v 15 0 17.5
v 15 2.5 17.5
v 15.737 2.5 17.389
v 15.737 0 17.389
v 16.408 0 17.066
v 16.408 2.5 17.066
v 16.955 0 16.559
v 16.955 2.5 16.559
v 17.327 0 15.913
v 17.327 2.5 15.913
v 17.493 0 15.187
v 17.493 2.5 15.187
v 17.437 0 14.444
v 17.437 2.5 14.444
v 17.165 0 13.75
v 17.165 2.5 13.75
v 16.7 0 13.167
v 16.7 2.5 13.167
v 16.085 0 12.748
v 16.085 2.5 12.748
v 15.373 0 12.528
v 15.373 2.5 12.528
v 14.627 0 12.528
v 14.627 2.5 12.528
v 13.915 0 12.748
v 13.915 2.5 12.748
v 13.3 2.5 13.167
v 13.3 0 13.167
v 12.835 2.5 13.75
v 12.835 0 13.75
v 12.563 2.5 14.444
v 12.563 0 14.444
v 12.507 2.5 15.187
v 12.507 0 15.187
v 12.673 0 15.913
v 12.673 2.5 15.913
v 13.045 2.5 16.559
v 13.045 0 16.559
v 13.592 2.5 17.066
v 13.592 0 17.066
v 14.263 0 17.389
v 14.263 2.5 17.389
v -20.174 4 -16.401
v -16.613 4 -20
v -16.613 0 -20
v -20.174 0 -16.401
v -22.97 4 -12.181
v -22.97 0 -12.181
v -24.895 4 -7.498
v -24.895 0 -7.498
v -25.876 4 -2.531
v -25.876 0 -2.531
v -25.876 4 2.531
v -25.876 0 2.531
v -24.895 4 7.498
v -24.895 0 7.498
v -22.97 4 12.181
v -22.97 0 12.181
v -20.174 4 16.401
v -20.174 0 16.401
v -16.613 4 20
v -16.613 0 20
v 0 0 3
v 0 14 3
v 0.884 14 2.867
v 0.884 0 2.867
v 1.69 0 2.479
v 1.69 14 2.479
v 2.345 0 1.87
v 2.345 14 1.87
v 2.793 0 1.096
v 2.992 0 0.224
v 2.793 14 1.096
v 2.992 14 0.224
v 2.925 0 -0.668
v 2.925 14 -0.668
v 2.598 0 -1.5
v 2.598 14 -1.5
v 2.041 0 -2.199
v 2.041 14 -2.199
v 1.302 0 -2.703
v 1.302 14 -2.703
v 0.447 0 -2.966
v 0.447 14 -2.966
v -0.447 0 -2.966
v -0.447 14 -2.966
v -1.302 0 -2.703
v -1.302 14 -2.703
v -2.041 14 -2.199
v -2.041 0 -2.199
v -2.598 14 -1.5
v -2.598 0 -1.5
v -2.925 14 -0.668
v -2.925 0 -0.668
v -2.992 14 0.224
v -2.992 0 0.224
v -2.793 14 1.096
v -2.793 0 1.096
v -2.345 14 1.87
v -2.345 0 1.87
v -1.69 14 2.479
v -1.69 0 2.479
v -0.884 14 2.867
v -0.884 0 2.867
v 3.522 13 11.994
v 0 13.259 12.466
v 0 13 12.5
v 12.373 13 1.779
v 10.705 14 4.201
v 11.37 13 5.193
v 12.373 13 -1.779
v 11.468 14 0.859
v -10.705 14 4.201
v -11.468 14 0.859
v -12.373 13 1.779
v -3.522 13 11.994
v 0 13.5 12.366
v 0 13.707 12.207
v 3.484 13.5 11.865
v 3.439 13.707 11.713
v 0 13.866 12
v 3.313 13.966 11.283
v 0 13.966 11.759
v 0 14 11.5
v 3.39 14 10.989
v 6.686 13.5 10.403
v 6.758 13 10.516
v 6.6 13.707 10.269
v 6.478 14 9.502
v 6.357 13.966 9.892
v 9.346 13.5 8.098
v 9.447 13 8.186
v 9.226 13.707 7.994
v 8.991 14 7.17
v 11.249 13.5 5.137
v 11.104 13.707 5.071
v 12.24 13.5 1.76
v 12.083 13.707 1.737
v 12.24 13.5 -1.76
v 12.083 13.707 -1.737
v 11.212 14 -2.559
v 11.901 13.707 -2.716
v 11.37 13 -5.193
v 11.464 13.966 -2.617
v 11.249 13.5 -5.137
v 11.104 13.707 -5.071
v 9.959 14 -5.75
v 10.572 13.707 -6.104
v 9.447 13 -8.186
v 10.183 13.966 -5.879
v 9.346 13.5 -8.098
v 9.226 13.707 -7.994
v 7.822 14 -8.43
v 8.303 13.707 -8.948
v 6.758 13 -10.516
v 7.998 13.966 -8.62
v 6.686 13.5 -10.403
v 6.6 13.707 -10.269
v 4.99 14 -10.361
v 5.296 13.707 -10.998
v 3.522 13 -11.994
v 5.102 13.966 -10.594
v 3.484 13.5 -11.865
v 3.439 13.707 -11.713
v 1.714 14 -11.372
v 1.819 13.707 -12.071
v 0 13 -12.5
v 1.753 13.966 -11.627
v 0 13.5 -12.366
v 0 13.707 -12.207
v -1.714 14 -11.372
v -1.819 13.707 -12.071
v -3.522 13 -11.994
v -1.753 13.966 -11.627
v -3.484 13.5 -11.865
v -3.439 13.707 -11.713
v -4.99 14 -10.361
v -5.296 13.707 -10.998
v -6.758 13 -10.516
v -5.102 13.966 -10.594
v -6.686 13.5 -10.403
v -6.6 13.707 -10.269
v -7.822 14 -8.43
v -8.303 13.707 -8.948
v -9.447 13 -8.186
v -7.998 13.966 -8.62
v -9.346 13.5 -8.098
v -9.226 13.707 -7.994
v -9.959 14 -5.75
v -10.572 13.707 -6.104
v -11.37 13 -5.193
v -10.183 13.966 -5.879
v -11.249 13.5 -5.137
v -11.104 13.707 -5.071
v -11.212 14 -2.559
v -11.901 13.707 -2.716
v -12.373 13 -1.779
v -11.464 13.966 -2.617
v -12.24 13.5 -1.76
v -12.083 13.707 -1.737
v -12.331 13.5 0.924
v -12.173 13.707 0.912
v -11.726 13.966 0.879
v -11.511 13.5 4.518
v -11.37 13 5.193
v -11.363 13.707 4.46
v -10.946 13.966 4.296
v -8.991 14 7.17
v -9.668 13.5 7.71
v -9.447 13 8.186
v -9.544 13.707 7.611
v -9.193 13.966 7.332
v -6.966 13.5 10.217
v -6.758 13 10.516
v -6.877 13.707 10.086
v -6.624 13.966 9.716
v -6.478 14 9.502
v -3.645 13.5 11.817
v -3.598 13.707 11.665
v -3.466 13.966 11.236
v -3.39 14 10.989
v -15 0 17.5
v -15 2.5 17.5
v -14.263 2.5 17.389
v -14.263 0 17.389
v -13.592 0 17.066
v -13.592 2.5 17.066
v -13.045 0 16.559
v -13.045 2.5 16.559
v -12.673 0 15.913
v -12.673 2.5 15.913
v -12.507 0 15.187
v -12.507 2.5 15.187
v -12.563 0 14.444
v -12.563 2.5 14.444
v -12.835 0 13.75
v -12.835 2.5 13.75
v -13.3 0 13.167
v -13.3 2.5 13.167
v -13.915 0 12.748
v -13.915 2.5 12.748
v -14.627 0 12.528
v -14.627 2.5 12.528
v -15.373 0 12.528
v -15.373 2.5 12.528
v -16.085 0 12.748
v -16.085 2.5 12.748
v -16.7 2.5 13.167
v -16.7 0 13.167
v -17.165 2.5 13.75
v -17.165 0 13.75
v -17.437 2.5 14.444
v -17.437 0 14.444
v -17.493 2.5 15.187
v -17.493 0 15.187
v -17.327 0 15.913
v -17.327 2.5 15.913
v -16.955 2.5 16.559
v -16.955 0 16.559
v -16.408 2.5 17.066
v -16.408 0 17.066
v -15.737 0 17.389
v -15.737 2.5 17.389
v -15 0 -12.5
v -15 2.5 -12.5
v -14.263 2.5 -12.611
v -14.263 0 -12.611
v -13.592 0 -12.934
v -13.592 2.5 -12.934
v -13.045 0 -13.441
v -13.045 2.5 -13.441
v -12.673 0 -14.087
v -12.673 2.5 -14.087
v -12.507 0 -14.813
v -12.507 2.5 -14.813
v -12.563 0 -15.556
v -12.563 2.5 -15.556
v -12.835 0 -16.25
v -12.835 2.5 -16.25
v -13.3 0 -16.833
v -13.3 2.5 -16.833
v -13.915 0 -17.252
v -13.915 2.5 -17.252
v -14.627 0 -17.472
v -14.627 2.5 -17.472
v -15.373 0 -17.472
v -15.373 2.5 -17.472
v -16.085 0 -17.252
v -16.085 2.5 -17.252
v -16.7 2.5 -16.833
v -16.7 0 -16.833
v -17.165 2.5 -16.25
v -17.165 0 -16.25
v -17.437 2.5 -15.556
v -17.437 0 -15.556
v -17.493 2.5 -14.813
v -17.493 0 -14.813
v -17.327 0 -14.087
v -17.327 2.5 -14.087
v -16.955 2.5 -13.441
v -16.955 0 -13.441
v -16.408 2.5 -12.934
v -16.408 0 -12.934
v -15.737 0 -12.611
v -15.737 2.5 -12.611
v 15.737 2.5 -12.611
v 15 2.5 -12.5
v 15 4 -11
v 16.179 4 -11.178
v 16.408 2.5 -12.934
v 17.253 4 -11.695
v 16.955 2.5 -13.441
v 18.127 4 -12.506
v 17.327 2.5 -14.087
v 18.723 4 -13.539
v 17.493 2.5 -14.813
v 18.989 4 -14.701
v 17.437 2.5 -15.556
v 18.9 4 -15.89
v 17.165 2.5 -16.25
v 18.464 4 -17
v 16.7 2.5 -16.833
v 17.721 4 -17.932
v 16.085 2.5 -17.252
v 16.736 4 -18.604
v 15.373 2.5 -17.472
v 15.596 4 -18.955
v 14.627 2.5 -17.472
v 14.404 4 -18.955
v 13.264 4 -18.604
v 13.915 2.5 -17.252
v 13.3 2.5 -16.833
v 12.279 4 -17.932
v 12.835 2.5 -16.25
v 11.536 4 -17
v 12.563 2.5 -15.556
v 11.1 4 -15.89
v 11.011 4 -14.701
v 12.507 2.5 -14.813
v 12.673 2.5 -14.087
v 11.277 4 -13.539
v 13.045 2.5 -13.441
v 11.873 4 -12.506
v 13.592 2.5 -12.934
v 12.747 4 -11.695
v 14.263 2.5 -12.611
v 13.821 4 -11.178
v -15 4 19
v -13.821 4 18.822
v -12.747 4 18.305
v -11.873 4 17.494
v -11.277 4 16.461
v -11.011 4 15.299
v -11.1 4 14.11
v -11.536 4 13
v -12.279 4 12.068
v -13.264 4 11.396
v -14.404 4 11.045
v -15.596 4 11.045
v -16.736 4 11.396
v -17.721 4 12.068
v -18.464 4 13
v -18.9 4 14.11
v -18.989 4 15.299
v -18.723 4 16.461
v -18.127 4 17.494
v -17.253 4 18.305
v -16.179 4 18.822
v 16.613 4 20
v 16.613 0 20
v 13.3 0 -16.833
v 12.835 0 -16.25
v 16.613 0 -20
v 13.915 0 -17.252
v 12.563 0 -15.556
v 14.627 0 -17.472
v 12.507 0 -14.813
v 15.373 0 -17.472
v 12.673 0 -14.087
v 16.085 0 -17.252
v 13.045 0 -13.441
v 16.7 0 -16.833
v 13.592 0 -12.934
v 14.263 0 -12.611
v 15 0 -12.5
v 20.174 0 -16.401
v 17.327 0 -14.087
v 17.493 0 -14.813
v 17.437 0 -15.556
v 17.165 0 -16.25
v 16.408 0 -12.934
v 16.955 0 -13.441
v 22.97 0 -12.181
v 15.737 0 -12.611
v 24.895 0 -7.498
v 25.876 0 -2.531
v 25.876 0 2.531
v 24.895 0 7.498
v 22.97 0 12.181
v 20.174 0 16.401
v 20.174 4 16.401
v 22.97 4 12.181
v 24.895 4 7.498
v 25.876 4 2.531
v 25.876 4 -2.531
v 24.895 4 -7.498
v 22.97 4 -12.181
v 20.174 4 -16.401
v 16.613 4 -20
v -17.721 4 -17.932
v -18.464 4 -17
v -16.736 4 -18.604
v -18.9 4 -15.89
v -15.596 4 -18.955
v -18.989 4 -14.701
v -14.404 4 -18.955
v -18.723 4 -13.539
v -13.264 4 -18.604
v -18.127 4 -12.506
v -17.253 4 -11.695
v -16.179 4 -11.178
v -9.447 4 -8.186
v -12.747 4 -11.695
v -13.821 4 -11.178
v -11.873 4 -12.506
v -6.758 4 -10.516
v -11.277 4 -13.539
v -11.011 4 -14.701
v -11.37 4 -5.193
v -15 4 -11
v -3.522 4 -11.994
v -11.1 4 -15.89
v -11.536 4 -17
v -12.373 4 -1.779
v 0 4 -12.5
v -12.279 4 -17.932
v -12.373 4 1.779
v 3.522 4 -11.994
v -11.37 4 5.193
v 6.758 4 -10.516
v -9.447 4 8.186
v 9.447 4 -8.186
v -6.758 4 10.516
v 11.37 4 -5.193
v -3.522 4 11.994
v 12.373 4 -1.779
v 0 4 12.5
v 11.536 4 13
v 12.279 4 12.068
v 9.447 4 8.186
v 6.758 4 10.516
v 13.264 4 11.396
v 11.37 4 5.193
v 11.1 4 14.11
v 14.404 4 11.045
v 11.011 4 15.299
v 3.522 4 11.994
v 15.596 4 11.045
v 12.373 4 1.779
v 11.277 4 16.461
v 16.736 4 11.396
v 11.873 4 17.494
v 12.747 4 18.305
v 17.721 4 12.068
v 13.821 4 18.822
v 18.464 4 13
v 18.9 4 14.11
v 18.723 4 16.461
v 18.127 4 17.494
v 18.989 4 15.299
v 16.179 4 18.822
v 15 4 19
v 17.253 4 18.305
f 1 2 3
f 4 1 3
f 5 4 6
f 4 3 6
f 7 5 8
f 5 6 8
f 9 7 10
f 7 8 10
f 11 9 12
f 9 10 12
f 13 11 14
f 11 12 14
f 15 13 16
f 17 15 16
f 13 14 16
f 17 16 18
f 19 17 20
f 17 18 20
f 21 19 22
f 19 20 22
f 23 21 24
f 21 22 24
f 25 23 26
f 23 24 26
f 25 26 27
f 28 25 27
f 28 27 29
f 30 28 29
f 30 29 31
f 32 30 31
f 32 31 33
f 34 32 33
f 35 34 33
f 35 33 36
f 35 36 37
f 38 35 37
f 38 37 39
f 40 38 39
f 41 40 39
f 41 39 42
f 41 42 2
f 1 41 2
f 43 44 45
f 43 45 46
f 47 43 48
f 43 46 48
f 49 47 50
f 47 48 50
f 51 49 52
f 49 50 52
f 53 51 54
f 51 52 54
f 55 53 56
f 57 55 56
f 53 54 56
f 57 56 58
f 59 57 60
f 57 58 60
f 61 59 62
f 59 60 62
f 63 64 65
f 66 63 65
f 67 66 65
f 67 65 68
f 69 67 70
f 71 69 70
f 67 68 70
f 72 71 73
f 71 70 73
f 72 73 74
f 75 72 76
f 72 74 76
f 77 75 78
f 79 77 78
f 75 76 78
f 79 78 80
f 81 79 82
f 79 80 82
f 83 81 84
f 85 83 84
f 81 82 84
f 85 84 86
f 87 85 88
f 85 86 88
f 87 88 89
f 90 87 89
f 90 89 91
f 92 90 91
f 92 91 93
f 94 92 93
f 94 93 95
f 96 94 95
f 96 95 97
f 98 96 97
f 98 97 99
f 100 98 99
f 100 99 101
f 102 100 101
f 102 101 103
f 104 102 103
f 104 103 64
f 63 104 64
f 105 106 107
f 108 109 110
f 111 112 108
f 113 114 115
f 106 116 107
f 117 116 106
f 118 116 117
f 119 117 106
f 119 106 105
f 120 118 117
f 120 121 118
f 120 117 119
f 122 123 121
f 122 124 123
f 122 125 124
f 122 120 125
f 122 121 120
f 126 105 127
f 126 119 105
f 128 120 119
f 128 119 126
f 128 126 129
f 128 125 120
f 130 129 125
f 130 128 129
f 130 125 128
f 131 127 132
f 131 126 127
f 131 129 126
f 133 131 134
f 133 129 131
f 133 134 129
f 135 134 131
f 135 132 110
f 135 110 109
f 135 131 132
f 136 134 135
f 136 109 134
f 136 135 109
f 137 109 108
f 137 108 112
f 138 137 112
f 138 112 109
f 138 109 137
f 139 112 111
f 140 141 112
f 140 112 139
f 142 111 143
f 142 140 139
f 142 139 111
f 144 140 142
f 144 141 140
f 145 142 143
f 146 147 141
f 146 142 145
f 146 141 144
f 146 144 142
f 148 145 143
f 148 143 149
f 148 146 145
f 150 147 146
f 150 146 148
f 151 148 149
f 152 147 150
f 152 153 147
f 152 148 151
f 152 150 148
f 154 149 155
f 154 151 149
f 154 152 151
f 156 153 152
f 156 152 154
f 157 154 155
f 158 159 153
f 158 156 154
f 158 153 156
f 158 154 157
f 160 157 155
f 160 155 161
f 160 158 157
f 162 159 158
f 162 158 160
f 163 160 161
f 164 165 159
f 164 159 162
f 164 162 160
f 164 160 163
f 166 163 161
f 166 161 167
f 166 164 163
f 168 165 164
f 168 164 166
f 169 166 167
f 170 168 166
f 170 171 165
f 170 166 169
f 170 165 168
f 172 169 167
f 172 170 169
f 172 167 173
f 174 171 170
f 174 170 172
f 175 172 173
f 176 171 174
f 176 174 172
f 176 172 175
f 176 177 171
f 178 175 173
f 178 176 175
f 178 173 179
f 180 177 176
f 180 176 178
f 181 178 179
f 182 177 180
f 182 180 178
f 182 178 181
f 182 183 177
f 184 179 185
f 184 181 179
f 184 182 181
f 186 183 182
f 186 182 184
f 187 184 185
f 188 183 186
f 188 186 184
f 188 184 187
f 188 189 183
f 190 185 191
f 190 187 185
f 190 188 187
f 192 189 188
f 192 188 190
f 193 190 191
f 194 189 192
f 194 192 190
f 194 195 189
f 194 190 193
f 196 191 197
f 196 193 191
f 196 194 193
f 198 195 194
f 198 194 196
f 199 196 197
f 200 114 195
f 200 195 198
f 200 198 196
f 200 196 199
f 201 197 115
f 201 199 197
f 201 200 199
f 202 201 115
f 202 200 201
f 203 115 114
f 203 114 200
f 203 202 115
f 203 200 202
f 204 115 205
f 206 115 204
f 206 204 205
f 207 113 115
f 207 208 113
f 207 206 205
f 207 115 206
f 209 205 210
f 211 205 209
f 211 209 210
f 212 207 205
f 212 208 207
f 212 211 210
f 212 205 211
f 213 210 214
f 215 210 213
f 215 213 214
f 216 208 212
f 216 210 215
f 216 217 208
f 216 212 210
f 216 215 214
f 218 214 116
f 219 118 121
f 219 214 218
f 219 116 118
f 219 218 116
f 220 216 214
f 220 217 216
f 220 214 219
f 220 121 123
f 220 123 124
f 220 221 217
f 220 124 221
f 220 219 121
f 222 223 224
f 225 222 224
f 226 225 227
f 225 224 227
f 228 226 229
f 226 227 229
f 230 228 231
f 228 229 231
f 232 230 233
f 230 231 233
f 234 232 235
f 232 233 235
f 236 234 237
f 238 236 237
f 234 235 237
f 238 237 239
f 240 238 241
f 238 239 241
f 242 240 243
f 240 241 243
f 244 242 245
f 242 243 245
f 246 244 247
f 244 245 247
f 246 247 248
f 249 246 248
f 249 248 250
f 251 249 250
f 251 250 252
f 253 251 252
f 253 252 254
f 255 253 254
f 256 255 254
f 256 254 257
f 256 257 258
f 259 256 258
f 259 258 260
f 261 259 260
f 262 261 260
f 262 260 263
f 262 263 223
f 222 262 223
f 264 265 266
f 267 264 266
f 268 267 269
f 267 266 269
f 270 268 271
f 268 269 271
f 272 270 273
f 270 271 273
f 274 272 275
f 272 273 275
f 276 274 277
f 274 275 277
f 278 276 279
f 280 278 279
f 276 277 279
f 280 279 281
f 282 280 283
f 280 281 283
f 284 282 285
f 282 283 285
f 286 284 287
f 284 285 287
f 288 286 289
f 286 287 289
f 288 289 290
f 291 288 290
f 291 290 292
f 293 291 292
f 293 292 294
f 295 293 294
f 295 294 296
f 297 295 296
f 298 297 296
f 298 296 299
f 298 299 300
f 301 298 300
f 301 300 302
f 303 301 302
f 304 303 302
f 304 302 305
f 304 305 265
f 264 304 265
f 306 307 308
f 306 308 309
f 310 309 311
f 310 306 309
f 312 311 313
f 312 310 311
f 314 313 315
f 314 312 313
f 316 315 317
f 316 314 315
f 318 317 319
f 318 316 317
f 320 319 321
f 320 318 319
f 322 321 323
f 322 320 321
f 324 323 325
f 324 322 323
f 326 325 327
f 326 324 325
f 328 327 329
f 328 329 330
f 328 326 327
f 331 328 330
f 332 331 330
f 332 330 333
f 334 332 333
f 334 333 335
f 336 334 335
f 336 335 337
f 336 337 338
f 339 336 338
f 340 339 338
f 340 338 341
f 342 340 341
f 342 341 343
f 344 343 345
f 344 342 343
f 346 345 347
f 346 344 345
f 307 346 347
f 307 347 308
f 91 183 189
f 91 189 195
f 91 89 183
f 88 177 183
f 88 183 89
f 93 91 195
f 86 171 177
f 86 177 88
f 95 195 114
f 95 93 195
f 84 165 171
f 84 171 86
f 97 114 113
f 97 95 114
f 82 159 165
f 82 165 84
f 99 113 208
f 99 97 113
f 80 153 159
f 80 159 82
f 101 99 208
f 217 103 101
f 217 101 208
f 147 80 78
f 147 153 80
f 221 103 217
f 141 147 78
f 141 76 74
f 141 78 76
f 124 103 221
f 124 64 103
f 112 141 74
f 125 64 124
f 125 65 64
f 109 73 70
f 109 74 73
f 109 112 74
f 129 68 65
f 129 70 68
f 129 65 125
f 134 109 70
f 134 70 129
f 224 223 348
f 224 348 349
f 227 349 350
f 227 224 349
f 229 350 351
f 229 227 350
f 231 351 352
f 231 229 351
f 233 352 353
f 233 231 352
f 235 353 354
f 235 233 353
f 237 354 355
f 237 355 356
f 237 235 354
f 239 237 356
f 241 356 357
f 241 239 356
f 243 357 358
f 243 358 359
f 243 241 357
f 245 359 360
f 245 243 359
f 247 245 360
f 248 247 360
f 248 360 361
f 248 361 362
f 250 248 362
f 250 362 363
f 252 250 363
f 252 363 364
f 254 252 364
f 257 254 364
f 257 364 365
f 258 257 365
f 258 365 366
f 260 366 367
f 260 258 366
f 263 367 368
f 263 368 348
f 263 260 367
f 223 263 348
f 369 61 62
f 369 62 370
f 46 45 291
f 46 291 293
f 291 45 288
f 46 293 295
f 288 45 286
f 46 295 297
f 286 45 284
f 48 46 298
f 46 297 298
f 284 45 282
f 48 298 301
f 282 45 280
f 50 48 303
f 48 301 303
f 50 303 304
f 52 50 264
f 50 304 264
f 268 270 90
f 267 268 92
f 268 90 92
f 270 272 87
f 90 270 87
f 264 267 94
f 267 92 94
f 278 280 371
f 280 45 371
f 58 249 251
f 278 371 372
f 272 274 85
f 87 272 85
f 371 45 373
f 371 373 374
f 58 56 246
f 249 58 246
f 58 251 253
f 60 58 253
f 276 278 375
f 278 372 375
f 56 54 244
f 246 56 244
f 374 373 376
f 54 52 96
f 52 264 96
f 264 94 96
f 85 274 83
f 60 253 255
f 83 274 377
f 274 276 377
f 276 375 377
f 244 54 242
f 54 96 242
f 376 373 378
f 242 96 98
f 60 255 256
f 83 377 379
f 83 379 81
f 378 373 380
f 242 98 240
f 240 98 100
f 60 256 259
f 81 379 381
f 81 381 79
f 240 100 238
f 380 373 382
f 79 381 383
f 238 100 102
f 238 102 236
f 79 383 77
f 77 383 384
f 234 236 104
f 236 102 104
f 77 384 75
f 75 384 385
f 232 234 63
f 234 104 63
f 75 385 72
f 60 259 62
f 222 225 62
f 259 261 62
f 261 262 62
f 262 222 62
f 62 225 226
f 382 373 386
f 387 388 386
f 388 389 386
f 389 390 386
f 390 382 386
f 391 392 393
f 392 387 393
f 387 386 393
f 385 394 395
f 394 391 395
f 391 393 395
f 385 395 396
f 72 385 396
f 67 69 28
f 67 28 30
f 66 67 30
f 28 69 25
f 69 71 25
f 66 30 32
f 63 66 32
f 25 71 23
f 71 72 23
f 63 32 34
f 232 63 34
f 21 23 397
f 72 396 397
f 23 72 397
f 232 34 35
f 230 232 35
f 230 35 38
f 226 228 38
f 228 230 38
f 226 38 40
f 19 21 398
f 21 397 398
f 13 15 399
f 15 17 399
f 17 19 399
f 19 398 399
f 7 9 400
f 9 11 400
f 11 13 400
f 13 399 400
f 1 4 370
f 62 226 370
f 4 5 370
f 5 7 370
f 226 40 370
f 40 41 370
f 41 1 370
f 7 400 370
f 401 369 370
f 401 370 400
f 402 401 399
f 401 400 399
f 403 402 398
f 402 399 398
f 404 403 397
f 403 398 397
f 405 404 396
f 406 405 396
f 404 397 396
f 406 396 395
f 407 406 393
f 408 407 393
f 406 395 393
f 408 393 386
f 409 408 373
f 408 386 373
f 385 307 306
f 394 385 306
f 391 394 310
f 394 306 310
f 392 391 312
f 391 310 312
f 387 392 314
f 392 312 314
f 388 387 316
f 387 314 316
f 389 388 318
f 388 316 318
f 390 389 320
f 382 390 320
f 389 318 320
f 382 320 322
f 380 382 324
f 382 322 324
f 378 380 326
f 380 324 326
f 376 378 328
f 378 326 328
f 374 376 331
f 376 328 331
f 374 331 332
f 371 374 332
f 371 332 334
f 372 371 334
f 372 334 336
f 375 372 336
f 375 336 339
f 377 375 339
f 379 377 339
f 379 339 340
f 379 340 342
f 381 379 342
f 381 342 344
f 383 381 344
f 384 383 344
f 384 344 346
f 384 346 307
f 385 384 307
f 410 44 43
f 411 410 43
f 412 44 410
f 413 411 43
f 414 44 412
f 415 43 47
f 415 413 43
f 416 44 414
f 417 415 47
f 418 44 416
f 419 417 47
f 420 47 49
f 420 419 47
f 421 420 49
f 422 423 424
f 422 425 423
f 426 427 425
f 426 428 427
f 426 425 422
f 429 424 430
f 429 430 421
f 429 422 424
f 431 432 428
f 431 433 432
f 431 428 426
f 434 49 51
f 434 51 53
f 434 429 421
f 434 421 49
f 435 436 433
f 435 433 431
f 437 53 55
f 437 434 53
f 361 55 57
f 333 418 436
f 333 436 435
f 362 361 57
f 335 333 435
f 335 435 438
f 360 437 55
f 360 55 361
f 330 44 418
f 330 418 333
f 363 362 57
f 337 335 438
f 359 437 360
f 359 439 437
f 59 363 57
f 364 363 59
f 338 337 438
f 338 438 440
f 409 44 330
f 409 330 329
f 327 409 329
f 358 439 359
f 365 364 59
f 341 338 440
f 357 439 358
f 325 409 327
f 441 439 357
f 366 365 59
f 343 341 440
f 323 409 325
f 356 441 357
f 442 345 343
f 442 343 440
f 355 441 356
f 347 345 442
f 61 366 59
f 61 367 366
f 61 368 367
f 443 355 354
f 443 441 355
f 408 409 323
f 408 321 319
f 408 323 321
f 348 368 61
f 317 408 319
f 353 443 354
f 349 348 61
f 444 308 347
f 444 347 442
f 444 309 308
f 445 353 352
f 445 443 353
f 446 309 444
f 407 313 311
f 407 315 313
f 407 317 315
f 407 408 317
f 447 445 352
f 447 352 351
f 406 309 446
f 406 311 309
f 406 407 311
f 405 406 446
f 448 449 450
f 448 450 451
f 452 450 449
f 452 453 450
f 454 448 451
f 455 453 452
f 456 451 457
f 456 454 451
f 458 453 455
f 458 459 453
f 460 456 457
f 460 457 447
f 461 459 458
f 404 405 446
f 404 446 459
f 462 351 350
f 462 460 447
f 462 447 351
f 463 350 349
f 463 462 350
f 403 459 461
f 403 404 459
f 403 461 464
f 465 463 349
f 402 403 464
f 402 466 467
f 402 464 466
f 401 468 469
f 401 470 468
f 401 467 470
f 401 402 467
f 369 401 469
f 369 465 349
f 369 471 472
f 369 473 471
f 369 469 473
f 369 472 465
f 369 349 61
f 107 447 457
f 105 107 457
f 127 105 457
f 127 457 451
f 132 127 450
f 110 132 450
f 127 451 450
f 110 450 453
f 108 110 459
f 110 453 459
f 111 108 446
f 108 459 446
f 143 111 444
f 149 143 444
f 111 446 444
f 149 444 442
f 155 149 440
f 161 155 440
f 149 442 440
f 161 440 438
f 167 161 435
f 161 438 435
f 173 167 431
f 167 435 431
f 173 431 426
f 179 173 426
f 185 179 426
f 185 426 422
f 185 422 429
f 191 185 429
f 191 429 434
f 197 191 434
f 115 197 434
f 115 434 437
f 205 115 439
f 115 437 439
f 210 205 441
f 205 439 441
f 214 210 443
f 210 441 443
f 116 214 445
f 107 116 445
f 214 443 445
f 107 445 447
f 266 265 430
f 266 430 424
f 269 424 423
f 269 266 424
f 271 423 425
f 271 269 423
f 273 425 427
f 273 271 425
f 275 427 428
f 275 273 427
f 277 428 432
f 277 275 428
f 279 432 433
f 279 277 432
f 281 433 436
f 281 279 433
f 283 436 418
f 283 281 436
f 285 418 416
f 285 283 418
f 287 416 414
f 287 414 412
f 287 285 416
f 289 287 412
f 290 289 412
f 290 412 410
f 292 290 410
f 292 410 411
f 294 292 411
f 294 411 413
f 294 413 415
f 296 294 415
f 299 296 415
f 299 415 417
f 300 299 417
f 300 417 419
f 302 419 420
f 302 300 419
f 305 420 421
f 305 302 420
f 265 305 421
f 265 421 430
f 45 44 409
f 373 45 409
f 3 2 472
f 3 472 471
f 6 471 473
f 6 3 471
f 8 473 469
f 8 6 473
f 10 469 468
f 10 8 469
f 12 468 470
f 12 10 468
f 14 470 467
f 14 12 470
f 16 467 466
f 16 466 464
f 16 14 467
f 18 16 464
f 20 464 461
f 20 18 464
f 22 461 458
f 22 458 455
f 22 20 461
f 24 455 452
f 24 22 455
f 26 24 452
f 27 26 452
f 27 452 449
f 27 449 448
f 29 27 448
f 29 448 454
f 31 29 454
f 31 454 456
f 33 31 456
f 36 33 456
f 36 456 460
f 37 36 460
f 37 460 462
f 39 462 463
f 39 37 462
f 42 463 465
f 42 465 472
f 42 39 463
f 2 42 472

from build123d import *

# Parameters (mm, degrees)
SKETCH_1_R           = 26
EXTRUDE_1_DEPTH      = 4
SKETCH_2_OUTSIDE_W   = 68.73
SKETCH_2_OUTSIDE_H   = 68.73
SKETCH_2_OUTSIDE_W_2 = 65.720202688
SKETCH_2_OUTSIDE_H_2 = 40
CUT_EXTRUDE_1_DEPTH  = 4
SKETCH_3_R           = 12.5
EXTRUDE_2_DEPTH      = 10
FILLET_1_R           = 1
CUT_EXTRUDE_2_REACH  = 37.665
SKETCH_4_R           = 3
CUT_EXTRUDE_3_REACH  = 36.293
SKETCH_5_R           = 2.5
CHAMFER_1_SIZE       = 1.5


with BuildPart() as part:
    # Эскиз1 → Бобышка-Вытянуть1 (new body)
    with BuildSketch(Plane(origin=(0, 0, 0), x_dir=(1, 0, 0), z_dir=(0, 1, 0))):
        with Locations(Location((0, 0, 0), (0, 0, 270))):
            Circle(SKETCH_1_R)
    extrude(amount=EXTRUDE_1_DEPTH)

    # Эскиз2 outside → Вырез-Вытянуть1 (cut)
    with BuildSketch(Plane(origin=(0, 4, 0), x_dir=(1, 0, 0), z_dir=(0, 1, 0))):
        Rectangle(SKETCH_2_OUTSIDE_W, SKETCH_2_OUTSIDE_H)
        Rectangle(SKETCH_2_OUTSIDE_W_2, SKETCH_2_OUTSIDE_H_2, mode=Mode.SUBTRACT)
    extrude(amount=-CUT_EXTRUDE_1_DEPTH, mode=Mode.SUBTRACT)

    # Эскиз3 → Бобышка-Вытянуть2 (add)
    with BuildSketch(Plane(origin=(0, 4, 0), x_dir=(1, 0, 0), z_dir=(0, 1, 0))):
        with Locations(Location((0, 0, 0), (0, 0, 270))):
            Circle(SKETCH_3_R)
    extrude(amount=EXTRUDE_2_DEPTH)

    # Скругление1
    fillet_1_edges = [part.edges().sort_by_distance(p)[0] for p in [
        (0, 14, -12.5),
    ]]
    fillet(fillet_1_edges, radius=FILLET_1_R)

    # Эскиз4 → Вырез-Вытянуть2 (cut, up to next)
    with BuildSketch(Plane(origin=(0, 14, 0), x_dir=(1, 0, 0), z_dir=(0, 1, 0)), mode=Mode.PRIVATE) as cut_extrude_2_sk1:
        with Locations(Location((0, 0, 0), (0, 0, 270))):
            Circle(SKETCH_4_R)
    cut_extrude_2_tool1 = extrude(cut_extrude_2_sk1.sketch, amount=-CUT_EXTRUDE_2_REACH, mode=Mode.PRIVATE) & part.part
    add(cut_extrude_2_tool1.solids().sort_by_distance((0, 14, 0))[0], mode=Mode.SUBTRACT)

    # Эскиз5 → Вырез-Вытянуть3 (cut, up to next)
    with BuildSketch(Plane(origin=(0, 4, 0), x_dir=(1, 0, 0), z_dir=(0, 1, 0)), mode=Mode.PRIVATE) as cut_extrude_3_sk1:
        with Locations(Location((-15, 15, 0), (0, 0, 270))):
            Circle(SKETCH_5_R)
    cut_extrude_3_tool1 = extrude(cut_extrude_3_sk1.sketch, amount=-CUT_EXTRUDE_3_REACH, mode=Mode.PRIVATE) & part.part
    # Эскиз5 → Вырез-Вытянуть3 (cut, up to next)
    with BuildSketch(Plane(origin=(0, 4, 0), x_dir=(1, 0, 0), z_dir=(0, 1, 0)), mode=Mode.PRIVATE) as cut_extrude_3_sk2:
        with Locations(Location((15, 15, 0), (0, 0, 270))):
            Circle(SKETCH_5_R)
    cut_extrude_3_tool2 = extrude(cut_extrude_3_sk2.sketch, amount=-CUT_EXTRUDE_3_REACH, mode=Mode.PRIVATE) & part.part
    # Эскиз5 → Вырез-Вытянуть3 (cut, up to next)
    with BuildSketch(Plane(origin=(0, 4, 0), x_dir=(1, 0, 0), z_dir=(0, 1, 0)), mode=Mode.PRIVATE) as cut_extrude_3_sk3:
        with Locations(Location((15, -15, 0), (0, 0, 270))):
            Circle(SKETCH_5_R)
    cut_extrude_3_tool3 = extrude(cut_extrude_3_sk3.sketch, amount=-CUT_EXTRUDE_3_REACH, mode=Mode.PRIVATE) & part.part
    # Эскиз5 → Вырез-Вытянуть3 (cut, up to next)
    with BuildSketch(Plane(origin=(0, 4, 0), x_dir=(1, 0, 0), z_dir=(0, 1, 0)), mode=Mode.PRIVATE) as cut_extrude_3_sk4:
        with Locations(Location((-15, -15, 0), (0, 0, 270))):
            Circle(SKETCH_5_R)
    cut_extrude_3_tool4 = extrude(cut_extrude_3_sk4.sketch, amount=-CUT_EXTRUDE_3_REACH, mode=Mode.PRIVATE) & part.part
    add(cut_extrude_3_tool1.solids().sort_by_distance((-15, 4, -15))[0], mode=Mode.SUBTRACT)
    add(cut_extrude_3_tool2.solids().sort_by_distance((15, 4, -15))[0], mode=Mode.SUBTRACT)
    add(cut_extrude_3_tool3.solids().sort_by_distance((15, 4, 15))[0], mode=Mode.SUBTRACT)
    add(cut_extrude_3_tool4.solids().sort_by_distance((-15, 4, 15))[0], mode=Mode.SUBTRACT)

    # Фаска1
    chamfer_1_edges = [part.edges().sort_by_distance(p)[0] for p in [
        (-15, 4, 12.5),
        (15, 4, 12.5),
        (15, 4, -17.5),
        (-15, 4, -17.5),
    ]]
    chamfer(chamfer_1_edges, length=CHAMFER_1_SIZE)


solid = part.part
